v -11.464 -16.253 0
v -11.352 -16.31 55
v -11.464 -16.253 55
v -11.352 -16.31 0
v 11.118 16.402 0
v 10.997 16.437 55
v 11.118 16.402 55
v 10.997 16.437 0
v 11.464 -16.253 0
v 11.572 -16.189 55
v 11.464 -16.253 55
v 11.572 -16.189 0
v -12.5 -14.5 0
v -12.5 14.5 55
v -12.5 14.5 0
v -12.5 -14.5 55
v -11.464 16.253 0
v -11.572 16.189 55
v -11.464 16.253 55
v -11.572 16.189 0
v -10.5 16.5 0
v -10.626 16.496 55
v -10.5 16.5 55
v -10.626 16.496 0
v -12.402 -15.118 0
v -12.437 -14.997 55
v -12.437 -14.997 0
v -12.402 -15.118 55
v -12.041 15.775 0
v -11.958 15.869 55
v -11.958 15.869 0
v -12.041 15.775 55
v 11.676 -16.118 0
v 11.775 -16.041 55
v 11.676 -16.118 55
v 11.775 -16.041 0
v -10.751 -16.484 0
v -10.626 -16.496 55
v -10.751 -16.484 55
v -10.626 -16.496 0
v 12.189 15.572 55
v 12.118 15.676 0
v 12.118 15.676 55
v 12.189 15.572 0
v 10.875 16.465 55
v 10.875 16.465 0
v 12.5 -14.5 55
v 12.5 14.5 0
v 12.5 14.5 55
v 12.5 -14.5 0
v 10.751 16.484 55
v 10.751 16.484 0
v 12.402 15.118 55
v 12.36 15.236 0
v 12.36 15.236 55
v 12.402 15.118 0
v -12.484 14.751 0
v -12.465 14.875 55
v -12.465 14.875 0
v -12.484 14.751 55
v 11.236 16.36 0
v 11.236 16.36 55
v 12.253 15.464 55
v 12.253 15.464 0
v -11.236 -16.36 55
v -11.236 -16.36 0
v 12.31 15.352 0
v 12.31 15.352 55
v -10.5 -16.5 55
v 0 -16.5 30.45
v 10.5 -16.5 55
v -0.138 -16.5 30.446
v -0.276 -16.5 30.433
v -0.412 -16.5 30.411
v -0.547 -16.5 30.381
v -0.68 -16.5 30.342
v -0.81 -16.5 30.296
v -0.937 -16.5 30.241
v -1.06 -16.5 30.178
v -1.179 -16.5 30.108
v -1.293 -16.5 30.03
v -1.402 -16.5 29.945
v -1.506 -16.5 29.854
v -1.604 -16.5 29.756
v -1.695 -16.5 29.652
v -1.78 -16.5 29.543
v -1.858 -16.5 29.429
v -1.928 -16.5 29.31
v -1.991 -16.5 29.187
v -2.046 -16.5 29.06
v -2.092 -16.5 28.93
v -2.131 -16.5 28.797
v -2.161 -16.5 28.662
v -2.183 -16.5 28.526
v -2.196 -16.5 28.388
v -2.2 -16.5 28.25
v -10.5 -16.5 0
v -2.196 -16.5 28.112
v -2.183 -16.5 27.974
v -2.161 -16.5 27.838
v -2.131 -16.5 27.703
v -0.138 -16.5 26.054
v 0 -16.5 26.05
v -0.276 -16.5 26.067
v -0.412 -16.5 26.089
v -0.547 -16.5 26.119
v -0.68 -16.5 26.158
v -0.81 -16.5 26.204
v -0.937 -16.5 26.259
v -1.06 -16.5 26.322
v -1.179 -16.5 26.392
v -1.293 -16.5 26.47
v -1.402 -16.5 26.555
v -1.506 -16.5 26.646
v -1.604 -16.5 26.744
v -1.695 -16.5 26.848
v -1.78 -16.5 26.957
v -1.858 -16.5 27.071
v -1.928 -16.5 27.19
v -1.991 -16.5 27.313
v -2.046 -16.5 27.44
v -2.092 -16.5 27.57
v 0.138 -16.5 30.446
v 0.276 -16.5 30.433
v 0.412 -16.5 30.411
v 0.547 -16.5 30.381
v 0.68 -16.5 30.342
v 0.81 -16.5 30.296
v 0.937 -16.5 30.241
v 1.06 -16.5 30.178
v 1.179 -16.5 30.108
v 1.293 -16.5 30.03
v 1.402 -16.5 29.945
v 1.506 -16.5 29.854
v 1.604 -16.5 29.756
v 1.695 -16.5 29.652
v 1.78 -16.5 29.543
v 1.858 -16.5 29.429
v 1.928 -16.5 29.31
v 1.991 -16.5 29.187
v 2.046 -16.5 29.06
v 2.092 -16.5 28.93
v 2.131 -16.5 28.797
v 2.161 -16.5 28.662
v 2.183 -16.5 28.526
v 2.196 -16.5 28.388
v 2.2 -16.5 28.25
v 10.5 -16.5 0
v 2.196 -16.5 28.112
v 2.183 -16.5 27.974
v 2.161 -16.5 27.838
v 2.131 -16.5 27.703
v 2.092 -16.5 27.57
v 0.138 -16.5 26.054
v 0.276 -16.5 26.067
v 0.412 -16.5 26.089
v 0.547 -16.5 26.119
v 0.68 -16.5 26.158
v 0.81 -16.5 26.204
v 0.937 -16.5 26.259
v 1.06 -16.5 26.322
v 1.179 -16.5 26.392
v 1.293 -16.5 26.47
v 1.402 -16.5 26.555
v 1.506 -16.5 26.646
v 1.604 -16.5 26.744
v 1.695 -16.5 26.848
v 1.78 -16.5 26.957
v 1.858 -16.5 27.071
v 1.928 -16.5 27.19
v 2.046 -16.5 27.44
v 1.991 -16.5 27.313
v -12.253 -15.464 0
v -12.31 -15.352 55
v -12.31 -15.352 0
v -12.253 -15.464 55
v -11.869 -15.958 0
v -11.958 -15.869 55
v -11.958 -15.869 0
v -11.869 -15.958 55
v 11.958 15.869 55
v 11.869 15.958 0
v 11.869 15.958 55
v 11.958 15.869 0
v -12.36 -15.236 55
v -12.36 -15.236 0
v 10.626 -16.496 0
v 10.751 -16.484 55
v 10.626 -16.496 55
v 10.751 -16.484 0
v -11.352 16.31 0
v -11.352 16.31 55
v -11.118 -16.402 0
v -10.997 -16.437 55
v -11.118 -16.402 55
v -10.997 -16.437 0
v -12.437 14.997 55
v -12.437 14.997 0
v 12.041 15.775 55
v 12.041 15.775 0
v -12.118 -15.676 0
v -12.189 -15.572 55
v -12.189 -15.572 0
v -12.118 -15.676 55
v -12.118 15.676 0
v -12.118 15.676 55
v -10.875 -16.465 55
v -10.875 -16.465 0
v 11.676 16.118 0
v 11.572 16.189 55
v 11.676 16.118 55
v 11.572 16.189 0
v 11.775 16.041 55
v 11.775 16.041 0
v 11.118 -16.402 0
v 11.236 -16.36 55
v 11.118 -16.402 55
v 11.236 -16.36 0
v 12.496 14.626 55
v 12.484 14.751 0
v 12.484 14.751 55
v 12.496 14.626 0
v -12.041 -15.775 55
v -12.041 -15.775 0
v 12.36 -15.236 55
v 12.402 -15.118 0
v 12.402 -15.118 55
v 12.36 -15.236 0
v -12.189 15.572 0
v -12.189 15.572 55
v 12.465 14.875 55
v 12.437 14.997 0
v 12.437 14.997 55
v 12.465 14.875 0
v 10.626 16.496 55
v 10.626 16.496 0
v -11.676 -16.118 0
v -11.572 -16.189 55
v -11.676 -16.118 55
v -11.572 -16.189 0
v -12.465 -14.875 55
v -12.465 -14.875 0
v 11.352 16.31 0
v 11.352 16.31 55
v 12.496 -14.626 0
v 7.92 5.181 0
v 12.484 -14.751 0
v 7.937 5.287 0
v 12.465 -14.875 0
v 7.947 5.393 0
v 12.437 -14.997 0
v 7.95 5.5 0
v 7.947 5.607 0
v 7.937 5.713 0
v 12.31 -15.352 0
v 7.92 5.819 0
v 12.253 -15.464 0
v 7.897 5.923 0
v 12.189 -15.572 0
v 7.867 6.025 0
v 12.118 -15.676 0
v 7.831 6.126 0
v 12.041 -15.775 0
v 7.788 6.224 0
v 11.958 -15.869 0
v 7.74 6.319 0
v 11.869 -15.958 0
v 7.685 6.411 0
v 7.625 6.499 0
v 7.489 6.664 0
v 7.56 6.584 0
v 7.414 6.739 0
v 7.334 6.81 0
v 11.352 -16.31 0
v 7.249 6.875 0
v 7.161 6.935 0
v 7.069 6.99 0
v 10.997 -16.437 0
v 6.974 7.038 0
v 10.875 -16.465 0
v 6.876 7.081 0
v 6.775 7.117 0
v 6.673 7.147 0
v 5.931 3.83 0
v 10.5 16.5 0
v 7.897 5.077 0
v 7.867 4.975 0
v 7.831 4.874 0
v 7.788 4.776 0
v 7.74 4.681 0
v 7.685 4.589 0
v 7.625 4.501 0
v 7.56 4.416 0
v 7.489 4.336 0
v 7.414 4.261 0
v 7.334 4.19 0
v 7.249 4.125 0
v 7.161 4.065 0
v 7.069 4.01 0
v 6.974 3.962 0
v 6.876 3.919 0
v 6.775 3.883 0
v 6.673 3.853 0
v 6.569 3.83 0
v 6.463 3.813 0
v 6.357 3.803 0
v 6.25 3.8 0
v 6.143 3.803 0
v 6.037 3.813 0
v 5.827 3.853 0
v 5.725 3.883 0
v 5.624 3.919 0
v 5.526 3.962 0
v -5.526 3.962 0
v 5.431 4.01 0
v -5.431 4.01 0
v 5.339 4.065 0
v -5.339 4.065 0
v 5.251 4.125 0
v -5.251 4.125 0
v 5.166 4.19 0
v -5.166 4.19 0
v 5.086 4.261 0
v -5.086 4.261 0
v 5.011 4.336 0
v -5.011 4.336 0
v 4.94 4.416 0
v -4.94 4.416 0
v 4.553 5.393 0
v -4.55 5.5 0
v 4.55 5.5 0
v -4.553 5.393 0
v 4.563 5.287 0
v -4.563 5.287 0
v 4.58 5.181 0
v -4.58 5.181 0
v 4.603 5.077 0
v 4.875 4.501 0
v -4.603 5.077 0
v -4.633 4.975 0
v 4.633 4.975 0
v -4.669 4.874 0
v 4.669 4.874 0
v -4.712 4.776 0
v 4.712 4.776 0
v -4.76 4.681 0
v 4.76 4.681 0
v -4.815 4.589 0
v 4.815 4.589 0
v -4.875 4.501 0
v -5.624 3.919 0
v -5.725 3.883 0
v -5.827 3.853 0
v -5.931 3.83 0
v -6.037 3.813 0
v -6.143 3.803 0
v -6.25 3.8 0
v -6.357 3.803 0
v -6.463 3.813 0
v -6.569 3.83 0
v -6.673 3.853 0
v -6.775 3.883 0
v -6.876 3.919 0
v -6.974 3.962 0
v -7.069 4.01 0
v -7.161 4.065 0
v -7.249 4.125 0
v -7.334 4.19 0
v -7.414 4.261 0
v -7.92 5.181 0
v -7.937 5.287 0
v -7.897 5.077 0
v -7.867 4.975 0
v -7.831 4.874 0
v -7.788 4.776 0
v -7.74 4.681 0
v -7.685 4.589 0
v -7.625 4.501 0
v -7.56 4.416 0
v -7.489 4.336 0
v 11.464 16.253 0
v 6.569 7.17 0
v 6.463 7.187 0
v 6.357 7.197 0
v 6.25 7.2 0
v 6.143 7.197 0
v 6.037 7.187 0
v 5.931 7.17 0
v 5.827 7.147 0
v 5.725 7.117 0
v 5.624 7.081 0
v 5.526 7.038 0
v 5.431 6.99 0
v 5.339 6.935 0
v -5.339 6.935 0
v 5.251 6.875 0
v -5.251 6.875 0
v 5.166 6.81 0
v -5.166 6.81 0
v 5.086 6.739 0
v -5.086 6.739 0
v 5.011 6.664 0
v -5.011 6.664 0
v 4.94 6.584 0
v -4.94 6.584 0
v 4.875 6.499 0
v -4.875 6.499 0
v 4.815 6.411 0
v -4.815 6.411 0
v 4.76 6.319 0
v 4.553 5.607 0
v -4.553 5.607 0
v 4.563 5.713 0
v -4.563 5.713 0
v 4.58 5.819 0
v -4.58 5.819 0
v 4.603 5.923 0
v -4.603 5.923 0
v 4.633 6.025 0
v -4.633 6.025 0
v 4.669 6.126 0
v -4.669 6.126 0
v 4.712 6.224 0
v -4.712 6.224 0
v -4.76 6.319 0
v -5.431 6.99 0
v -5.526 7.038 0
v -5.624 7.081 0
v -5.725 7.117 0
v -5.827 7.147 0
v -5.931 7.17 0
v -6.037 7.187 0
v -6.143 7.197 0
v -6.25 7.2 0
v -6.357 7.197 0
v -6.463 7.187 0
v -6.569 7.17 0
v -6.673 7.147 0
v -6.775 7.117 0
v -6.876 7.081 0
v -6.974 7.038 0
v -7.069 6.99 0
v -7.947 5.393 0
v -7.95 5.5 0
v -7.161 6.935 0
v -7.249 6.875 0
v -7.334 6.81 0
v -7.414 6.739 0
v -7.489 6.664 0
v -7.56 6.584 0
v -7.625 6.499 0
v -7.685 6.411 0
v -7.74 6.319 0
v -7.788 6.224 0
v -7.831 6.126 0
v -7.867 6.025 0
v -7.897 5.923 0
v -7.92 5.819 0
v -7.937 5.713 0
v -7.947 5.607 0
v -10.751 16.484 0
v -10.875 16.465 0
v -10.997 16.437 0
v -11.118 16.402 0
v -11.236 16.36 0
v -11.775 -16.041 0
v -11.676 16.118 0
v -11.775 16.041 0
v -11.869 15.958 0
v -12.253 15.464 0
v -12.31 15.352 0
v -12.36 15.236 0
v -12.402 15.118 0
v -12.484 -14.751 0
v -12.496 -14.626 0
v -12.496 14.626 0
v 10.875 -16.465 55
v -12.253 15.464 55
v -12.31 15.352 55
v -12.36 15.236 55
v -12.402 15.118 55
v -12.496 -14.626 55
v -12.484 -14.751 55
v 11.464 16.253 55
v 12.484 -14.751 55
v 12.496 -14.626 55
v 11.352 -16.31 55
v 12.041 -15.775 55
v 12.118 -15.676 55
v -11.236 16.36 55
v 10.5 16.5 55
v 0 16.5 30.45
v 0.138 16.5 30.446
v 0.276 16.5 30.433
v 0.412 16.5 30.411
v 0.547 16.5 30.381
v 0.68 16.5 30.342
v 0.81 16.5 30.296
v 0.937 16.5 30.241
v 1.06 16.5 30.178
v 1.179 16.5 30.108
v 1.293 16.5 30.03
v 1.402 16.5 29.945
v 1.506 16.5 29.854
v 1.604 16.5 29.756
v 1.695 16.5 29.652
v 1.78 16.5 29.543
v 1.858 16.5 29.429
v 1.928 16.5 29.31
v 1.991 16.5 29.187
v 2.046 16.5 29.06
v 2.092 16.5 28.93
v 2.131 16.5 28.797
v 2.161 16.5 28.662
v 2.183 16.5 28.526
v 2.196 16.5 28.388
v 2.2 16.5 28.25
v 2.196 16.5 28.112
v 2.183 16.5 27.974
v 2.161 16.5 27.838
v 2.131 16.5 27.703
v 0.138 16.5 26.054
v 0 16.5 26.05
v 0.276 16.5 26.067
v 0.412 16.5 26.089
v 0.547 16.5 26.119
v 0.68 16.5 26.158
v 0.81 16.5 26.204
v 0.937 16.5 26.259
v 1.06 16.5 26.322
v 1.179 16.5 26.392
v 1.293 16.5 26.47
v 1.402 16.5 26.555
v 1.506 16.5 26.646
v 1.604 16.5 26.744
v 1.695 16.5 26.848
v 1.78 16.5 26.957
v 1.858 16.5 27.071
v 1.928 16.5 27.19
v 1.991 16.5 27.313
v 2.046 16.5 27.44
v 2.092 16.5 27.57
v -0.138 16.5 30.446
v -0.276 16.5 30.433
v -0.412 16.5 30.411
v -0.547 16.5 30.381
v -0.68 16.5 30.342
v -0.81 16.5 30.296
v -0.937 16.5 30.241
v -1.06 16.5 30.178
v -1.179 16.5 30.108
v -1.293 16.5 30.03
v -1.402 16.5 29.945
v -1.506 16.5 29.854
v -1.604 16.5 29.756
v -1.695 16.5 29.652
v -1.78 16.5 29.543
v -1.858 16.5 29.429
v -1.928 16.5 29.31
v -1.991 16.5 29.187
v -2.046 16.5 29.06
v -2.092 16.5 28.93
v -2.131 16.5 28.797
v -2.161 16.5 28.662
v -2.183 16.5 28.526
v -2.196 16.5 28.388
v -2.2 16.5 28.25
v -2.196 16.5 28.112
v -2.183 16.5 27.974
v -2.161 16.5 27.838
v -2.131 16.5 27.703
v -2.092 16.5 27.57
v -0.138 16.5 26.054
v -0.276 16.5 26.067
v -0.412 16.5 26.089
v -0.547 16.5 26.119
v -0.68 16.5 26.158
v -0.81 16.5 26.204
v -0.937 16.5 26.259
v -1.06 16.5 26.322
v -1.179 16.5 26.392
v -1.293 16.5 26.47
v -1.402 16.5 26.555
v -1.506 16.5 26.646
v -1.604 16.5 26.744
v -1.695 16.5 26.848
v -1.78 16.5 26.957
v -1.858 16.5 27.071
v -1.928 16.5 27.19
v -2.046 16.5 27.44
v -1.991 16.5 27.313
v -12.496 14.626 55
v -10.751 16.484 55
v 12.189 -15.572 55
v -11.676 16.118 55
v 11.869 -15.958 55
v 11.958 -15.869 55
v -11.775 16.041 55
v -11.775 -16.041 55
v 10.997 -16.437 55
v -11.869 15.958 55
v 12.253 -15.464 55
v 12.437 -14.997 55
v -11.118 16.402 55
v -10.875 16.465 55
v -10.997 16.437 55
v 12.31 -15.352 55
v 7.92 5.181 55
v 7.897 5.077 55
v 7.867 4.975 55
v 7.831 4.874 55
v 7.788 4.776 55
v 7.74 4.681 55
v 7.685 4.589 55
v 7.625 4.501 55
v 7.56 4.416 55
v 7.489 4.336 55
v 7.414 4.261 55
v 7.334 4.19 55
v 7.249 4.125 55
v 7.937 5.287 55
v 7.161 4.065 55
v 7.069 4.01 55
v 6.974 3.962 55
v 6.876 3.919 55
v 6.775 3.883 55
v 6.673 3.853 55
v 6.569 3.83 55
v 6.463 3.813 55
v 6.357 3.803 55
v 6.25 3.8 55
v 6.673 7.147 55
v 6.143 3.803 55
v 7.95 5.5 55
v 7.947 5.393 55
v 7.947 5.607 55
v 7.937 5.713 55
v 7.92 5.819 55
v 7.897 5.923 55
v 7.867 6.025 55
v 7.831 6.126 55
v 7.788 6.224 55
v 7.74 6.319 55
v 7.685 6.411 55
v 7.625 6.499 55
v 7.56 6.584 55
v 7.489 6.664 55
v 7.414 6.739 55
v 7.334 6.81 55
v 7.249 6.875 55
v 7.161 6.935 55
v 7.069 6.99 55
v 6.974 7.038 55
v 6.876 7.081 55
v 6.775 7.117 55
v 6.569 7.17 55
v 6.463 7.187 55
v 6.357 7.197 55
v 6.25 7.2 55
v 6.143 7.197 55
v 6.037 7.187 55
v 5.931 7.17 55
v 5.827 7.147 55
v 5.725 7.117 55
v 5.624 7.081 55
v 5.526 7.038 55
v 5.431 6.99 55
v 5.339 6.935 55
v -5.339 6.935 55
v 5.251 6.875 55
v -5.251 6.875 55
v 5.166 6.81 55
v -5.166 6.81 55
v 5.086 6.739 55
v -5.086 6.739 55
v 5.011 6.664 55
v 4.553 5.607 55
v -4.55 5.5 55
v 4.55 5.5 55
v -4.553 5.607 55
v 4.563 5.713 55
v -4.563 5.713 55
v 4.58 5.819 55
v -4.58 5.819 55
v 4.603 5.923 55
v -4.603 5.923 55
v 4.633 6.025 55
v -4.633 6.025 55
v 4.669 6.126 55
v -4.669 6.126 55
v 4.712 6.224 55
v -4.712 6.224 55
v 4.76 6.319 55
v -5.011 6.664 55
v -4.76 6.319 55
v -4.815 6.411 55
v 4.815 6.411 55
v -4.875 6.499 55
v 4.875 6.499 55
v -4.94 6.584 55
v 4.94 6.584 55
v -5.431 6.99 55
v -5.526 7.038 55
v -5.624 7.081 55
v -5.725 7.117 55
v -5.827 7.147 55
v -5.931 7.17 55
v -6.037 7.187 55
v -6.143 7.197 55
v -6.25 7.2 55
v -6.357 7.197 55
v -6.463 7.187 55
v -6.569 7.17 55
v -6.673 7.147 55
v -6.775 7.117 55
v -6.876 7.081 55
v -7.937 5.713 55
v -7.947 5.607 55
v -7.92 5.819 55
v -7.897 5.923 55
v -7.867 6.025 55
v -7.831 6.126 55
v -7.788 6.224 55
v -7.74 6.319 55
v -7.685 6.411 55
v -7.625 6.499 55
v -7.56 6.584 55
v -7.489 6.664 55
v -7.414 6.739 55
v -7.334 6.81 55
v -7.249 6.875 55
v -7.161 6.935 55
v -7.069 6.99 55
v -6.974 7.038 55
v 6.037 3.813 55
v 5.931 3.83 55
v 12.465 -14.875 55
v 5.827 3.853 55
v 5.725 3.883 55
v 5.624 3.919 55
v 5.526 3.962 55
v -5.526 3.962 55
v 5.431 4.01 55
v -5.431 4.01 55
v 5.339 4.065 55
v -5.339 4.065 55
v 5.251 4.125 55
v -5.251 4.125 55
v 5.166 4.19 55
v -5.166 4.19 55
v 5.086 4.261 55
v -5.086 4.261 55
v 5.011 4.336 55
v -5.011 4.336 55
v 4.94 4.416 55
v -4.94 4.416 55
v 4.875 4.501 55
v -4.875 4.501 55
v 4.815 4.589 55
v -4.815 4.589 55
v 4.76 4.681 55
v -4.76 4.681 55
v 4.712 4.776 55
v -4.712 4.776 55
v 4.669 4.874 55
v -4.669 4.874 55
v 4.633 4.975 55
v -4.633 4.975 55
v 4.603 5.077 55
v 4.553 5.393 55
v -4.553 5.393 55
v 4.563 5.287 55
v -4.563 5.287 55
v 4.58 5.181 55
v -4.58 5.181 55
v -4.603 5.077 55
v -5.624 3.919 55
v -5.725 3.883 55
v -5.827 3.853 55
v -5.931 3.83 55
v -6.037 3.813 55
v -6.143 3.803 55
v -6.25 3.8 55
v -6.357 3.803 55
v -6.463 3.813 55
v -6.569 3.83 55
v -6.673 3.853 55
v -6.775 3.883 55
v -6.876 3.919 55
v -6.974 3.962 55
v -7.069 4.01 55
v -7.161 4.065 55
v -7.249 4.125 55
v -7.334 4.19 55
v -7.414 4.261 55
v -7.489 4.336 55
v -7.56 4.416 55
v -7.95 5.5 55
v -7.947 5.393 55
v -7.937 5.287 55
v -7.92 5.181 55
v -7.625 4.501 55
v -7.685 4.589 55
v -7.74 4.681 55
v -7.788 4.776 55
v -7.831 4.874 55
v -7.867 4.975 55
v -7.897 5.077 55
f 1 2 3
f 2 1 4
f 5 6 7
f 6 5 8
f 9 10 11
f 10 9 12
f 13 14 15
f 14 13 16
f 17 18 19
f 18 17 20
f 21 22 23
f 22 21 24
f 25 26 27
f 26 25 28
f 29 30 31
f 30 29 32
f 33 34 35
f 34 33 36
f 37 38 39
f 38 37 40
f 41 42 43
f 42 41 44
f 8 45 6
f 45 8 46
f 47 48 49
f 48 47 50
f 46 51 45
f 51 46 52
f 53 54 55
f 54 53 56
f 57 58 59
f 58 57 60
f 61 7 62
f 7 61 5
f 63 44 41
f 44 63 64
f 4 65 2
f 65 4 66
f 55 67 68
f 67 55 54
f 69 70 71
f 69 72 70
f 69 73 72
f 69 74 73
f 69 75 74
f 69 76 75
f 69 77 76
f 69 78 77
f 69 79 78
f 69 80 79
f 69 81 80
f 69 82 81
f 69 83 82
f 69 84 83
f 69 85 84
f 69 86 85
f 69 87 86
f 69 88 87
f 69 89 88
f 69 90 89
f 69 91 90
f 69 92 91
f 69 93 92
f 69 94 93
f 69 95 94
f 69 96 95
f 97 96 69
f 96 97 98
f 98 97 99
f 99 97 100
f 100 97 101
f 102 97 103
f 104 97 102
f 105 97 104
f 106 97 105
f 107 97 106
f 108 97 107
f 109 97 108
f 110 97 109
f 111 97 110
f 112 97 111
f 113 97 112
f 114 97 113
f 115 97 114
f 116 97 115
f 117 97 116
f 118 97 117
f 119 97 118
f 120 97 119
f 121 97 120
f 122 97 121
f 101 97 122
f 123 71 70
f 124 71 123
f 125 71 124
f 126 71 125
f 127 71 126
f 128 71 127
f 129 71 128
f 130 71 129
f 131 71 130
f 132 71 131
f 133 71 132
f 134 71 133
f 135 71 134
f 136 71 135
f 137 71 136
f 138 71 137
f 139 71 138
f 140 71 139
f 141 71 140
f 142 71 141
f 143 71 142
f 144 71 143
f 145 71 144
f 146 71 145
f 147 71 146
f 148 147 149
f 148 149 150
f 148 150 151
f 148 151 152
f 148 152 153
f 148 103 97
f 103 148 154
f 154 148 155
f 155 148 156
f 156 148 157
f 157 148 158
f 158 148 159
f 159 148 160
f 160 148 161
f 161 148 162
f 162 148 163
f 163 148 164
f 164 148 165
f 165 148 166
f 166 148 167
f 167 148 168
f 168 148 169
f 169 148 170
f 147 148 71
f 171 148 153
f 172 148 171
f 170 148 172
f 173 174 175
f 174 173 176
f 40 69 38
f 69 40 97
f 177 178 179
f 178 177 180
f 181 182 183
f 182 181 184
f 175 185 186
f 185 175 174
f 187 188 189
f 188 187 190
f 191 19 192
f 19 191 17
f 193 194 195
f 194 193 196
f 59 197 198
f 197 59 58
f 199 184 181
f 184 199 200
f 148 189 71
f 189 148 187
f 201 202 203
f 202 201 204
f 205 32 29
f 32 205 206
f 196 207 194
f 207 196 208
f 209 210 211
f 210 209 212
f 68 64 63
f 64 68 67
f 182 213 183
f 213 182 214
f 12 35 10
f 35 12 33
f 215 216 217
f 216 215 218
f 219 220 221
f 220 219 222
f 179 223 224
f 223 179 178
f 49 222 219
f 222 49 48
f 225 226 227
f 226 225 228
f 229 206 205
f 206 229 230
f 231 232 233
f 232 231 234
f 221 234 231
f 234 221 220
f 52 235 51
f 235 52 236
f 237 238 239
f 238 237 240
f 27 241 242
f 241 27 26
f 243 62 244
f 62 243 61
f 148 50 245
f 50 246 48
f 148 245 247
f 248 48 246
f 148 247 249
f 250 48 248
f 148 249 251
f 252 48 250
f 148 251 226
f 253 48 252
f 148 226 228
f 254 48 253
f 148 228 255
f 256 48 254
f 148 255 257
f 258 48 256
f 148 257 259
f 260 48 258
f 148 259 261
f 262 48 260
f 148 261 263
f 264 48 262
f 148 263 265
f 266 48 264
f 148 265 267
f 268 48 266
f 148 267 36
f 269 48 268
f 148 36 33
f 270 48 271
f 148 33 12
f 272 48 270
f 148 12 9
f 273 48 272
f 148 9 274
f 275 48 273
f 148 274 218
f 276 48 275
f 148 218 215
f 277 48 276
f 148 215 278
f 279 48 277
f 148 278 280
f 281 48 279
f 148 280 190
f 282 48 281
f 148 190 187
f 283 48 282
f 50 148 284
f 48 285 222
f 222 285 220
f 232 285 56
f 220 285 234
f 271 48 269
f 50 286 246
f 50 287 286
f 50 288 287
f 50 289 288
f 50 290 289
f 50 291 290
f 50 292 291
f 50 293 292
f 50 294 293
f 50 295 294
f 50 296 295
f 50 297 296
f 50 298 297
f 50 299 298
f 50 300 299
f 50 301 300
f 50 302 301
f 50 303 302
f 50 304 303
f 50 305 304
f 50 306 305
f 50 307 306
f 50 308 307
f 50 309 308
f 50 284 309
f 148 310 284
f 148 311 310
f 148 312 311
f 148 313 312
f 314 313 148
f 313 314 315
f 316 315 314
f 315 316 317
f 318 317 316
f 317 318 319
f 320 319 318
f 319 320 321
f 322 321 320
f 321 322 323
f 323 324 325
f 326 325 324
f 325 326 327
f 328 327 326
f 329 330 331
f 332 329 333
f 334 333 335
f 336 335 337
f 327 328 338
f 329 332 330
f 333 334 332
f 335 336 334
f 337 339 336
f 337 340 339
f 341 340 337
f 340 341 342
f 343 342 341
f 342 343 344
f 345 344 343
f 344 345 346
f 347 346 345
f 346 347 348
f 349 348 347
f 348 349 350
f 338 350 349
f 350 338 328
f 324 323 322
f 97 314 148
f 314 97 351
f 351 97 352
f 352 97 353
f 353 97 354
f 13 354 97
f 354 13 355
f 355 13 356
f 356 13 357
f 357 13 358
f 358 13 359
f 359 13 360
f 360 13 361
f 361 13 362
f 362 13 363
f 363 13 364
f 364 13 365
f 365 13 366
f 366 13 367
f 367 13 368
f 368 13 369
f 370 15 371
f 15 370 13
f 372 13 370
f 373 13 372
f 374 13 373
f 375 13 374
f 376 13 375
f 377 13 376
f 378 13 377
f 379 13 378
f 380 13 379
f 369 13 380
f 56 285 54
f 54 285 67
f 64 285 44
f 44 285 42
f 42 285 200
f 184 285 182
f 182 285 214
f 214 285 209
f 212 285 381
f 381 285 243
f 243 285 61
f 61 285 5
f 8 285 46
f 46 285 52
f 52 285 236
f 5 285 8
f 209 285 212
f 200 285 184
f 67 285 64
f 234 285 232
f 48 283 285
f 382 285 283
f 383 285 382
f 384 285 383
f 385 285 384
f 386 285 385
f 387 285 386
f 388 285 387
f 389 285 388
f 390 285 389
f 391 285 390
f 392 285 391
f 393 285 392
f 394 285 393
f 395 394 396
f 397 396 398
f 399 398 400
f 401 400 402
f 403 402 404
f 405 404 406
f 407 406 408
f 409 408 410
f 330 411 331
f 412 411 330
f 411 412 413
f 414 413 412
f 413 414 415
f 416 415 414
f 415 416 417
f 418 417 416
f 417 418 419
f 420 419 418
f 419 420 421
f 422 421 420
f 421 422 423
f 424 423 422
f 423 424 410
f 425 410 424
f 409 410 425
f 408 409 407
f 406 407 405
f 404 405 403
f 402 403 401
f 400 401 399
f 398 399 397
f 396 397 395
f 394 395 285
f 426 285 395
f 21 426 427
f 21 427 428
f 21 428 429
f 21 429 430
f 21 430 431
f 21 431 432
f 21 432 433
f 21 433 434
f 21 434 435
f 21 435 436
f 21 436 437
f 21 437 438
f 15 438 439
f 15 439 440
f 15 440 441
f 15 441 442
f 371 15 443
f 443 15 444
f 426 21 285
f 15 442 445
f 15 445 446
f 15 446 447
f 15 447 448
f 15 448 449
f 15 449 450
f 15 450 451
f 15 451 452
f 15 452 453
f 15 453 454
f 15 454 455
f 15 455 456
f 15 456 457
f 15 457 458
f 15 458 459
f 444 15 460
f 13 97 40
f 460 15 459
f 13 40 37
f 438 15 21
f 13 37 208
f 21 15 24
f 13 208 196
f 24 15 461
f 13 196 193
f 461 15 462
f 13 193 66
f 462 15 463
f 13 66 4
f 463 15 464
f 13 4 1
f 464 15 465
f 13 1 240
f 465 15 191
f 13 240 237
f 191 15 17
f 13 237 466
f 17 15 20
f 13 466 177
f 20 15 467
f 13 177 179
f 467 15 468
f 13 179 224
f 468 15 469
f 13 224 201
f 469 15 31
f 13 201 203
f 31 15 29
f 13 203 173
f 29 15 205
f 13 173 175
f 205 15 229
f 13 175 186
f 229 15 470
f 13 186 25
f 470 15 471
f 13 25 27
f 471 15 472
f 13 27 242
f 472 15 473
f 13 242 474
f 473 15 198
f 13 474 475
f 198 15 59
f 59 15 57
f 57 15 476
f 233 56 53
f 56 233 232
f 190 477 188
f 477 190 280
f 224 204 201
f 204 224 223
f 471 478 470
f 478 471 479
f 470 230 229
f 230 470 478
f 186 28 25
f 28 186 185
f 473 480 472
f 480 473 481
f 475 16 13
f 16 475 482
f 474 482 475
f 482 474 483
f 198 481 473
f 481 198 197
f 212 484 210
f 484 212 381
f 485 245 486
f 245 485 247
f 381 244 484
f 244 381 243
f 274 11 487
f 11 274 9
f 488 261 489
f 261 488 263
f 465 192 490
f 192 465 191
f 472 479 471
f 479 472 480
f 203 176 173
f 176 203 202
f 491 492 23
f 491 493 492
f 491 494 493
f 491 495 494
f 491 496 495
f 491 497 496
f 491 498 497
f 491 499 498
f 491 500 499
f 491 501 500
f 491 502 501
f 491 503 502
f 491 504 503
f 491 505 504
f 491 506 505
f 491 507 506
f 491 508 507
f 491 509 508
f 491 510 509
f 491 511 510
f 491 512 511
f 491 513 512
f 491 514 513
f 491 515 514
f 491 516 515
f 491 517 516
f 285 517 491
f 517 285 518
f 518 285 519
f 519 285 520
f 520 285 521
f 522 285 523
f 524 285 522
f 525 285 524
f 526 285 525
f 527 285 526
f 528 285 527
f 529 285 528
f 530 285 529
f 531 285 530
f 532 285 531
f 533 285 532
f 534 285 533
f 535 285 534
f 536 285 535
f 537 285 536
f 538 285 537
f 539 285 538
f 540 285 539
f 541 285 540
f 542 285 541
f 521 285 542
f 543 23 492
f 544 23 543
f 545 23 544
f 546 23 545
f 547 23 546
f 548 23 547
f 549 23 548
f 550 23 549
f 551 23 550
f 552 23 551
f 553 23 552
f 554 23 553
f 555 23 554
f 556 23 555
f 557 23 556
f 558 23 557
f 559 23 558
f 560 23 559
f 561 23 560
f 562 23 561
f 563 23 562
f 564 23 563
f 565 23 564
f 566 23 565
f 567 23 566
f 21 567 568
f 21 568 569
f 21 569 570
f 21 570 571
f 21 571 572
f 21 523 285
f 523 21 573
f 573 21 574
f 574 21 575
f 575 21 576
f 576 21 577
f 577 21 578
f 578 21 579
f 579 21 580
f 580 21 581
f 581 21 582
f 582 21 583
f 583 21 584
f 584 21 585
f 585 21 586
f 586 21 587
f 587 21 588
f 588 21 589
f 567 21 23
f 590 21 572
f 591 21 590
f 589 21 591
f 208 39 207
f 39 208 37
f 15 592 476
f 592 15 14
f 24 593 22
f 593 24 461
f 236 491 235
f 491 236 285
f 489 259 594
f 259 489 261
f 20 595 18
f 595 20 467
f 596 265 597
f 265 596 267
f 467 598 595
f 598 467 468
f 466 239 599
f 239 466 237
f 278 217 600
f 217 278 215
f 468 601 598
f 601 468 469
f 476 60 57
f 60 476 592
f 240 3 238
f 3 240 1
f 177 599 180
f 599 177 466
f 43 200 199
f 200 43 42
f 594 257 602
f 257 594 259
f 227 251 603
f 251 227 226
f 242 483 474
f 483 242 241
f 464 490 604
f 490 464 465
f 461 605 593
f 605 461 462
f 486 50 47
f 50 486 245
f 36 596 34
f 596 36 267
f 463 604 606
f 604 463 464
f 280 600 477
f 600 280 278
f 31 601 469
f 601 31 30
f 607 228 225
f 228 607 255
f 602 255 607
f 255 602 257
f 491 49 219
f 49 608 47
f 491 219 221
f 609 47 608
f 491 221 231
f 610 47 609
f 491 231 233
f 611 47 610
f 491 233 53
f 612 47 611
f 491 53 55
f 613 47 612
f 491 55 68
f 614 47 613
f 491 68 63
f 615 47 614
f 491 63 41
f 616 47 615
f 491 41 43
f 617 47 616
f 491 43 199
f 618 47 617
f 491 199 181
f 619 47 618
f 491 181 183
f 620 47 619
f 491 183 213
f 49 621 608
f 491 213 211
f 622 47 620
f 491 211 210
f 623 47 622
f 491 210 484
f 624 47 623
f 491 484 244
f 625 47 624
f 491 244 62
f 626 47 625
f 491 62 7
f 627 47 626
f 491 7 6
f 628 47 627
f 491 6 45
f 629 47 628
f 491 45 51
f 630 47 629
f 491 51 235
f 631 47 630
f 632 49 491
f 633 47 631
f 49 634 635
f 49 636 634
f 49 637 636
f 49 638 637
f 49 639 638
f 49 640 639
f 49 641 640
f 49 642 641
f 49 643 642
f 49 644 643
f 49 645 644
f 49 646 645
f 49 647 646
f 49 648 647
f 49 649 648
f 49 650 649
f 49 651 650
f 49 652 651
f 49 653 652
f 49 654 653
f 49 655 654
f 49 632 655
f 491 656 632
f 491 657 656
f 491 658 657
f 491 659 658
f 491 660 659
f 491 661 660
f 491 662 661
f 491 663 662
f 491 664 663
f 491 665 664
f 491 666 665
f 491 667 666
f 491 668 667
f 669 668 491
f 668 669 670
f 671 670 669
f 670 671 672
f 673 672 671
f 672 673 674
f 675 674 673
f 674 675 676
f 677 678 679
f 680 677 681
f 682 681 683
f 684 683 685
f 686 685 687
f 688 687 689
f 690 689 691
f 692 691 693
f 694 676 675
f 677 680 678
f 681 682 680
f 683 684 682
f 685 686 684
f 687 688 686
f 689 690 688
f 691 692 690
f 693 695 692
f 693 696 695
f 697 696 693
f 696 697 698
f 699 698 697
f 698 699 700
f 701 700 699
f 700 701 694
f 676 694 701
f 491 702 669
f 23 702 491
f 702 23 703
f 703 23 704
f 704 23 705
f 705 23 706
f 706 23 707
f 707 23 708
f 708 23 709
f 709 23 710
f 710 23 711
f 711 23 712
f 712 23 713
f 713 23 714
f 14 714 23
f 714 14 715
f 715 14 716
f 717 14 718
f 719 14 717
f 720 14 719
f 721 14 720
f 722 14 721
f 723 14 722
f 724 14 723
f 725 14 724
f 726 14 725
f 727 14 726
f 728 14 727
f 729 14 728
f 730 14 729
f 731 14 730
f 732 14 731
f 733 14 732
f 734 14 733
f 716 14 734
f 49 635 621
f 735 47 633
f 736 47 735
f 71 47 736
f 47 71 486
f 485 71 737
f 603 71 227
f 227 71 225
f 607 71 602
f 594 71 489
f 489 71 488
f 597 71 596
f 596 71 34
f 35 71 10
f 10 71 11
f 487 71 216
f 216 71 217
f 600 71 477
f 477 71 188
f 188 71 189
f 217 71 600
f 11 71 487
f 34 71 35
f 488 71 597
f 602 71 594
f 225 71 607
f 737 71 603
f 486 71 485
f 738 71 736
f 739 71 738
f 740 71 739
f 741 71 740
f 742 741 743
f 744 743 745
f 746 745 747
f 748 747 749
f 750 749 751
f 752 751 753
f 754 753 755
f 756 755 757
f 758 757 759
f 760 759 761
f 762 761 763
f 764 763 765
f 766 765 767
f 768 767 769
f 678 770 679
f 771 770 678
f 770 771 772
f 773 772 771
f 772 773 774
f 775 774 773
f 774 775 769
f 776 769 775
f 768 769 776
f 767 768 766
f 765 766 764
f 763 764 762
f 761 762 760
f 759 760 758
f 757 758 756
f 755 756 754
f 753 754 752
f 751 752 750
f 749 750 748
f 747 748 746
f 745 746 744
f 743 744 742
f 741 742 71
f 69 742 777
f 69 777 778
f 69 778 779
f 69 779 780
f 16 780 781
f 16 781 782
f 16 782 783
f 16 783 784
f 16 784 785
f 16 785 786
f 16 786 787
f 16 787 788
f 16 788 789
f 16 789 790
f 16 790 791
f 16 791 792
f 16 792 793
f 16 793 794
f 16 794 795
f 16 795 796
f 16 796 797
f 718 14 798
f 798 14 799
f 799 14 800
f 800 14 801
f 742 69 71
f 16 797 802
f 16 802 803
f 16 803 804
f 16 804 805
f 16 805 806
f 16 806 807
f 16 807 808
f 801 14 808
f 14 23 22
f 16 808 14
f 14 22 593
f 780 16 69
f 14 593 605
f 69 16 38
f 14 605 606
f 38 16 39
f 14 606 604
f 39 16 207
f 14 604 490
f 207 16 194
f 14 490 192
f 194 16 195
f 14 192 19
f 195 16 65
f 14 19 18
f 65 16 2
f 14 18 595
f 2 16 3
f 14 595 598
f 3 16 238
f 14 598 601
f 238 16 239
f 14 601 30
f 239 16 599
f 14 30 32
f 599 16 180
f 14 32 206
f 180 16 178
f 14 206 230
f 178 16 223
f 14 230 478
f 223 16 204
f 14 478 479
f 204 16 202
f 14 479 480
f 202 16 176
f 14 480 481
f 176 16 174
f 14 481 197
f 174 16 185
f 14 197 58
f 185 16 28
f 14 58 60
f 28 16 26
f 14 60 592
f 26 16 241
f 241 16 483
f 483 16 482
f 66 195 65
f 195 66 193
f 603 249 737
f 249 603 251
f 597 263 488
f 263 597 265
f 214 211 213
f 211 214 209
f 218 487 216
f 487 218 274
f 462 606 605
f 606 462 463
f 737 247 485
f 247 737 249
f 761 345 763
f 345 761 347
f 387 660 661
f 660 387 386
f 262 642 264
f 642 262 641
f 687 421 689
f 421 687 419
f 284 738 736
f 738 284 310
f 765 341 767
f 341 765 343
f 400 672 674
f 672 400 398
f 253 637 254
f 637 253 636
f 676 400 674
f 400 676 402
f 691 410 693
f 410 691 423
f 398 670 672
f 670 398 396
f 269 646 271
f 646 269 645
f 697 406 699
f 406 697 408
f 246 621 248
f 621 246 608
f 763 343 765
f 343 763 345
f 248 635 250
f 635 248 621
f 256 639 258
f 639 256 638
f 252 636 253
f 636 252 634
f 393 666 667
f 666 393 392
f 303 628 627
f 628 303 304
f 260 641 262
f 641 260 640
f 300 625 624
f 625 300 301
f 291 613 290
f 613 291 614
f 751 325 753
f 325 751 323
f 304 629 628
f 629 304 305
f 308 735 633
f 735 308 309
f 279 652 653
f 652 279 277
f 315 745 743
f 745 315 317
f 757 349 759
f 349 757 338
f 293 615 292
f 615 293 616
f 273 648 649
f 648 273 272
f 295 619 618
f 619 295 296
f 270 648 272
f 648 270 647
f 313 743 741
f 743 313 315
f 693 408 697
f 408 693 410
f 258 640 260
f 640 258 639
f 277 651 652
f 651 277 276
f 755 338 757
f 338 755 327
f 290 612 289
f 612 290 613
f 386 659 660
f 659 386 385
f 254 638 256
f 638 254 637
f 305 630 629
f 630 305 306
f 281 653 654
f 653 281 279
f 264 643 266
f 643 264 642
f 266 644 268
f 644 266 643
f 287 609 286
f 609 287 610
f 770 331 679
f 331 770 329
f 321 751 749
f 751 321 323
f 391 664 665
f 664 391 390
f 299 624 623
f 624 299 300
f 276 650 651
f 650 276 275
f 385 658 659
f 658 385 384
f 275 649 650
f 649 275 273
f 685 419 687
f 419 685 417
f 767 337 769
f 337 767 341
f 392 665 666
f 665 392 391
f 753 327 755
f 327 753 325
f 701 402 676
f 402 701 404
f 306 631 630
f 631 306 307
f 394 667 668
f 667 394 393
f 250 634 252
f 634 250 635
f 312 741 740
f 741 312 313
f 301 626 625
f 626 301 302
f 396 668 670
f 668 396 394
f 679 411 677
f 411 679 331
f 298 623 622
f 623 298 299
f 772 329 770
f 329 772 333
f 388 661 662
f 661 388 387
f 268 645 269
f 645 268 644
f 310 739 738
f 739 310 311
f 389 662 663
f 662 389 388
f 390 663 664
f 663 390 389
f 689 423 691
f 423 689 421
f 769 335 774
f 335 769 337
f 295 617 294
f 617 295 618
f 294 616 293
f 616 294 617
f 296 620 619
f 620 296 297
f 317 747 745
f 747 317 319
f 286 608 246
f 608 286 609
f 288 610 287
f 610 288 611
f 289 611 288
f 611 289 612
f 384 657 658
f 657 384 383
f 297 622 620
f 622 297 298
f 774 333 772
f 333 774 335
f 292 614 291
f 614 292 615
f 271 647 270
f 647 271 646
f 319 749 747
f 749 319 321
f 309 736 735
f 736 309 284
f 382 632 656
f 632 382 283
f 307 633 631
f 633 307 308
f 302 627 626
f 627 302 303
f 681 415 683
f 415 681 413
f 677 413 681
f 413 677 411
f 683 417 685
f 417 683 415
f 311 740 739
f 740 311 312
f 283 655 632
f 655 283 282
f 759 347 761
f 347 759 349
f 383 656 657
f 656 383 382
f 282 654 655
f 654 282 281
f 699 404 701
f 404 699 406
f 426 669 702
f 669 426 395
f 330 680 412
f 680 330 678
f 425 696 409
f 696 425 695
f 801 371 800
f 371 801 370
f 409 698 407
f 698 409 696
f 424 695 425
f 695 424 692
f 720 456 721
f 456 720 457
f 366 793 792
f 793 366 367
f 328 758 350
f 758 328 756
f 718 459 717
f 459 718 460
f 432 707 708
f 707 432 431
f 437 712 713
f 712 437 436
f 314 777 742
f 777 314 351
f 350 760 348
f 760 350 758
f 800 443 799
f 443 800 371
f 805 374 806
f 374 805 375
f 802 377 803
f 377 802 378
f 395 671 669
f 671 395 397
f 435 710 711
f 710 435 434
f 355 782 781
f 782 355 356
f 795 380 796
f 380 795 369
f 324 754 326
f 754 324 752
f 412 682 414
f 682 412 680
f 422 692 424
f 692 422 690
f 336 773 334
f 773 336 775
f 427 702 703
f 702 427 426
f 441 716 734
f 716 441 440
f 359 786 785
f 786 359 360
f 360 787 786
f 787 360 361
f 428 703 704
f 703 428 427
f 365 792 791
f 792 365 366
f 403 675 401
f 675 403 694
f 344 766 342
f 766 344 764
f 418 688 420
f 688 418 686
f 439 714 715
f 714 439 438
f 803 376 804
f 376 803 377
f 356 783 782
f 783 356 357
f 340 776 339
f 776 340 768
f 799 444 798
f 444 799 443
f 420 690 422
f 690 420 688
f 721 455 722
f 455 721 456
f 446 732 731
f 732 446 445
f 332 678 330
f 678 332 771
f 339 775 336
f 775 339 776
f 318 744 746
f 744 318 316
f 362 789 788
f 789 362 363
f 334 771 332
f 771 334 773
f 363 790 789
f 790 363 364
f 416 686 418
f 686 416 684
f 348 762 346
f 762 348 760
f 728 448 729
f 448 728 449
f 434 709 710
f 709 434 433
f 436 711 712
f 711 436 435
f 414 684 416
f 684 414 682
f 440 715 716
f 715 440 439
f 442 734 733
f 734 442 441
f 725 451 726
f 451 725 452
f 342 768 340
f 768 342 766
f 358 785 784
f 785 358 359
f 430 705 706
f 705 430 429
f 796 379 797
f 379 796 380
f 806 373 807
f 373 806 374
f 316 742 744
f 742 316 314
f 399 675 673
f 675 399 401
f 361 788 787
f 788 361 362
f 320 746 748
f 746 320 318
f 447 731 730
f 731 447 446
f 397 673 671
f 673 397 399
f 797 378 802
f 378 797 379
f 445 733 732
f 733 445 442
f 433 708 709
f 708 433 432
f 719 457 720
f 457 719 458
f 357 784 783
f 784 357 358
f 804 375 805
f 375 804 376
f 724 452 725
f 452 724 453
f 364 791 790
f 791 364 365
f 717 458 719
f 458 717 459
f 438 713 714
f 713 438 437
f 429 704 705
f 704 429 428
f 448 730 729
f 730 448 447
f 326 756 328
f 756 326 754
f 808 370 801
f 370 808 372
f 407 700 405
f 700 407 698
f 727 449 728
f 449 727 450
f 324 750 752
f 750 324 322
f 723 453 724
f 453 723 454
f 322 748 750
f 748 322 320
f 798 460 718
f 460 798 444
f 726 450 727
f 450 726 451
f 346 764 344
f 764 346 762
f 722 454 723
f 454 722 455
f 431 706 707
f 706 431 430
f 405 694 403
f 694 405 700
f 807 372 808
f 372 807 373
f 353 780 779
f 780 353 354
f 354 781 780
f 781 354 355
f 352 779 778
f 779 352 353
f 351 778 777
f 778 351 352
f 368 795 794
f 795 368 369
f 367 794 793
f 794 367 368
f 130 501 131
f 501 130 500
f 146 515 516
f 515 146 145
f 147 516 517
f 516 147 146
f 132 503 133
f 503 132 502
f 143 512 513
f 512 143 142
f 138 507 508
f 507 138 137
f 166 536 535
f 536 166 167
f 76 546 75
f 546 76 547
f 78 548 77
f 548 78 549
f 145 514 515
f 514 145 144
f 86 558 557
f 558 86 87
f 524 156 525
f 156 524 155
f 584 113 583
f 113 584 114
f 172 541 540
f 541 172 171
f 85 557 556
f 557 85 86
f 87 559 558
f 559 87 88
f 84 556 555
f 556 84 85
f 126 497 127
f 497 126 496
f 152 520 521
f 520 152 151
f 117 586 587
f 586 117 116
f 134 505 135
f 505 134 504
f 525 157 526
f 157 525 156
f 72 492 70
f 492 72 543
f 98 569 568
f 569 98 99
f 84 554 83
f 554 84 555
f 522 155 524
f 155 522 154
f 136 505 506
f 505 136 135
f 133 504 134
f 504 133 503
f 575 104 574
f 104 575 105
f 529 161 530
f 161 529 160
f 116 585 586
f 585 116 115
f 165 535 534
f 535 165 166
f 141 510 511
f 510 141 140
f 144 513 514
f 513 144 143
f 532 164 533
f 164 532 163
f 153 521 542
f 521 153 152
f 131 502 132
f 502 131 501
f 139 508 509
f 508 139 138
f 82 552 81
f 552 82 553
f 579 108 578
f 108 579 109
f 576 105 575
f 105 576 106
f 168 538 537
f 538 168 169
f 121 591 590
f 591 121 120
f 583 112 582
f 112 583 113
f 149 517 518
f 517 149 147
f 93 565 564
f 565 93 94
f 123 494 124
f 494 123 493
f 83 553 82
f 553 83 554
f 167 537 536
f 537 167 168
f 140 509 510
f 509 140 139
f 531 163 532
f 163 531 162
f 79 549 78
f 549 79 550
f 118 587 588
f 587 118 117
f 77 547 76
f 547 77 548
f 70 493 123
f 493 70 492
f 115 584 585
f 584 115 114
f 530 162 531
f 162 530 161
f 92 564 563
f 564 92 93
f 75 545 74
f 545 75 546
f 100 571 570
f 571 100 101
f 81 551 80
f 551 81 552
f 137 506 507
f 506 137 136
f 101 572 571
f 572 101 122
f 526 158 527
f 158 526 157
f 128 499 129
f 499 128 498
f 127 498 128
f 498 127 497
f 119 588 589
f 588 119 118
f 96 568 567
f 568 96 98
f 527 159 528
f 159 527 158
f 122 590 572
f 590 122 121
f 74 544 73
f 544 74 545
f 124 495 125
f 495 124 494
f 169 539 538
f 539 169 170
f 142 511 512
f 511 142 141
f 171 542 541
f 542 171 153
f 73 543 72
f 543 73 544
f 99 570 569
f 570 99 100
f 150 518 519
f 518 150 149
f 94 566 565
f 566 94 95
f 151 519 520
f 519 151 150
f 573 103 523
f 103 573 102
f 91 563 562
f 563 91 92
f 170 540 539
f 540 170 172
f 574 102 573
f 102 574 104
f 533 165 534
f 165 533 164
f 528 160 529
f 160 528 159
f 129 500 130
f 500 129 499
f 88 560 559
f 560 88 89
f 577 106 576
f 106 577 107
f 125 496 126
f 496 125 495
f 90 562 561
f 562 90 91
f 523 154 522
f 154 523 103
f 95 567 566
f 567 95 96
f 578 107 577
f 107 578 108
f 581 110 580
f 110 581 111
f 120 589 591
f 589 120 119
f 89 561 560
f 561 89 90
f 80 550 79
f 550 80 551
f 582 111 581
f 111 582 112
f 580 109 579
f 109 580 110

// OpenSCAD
$fn=100;

// nut dimensions wrench, height, epsilon
/*  UNUSED
wNut = 5.5;
hNut = 2.5;
eNut = 0.2;
*/

// guitar max thickness at butt
hGuitar = 44;

// block height,width,depth
hBlock = 55;
wBlock = 25;
dBlock = 33;


// slot height above base and below top of column, all the rest is computed
sHeight=10;

// dBolt depthwise offset from face away from guitar
dOffset = dBlock/3.;

//hBolt hole offset from base
hOffset = hBlock-hGuitar/2.0; // high hole centered
hlOffset =  28.25;  // low hole average of 28 and 28.5

// bolt diamenters and epsilon
dBolt = 3;
hBolt = 4;
eBolt = 0.2;

// oval cover plate, ratio of ovality 2/1
hPlate = 3;
wPlate = wBlock;
ePlate=1;
ratioPlate = 0.5;

// single hol cylindrical spacer
dCy = 20.0;
hCy = hBlock;

module cyPlate(){
    color("green")
    //scale([1,1,1])
        cylinder(d=dCy-ePlate,h=hPlate,center=true);
}

module cyBlock(hh,dd){
   color("SteelBlue")
       translate([0,0,hh/2.0])
           cylinder(d=dd, h=hh, center=true);
} 

module plate(){
    color("green")
    scale([1,ratioPlate,1])
        cylinder(d=wPlate-ePlate,h=hPlate,center=true);
}
/* UNUSED
module nut(wrench,thickness){
    // make a nut, centered at 0,0,0
    r = wrench/(2.0*cos(30));
    translate([0,0,-thickness/2.0])
        rotate([0,0,30])
        linear_extrude(height=thickness)
            circle(r,$fn=6);   
}
module slot(w,l,h){
    // make a slot centered at 0,0,0
    translate([0,0,h/2.0])
        cube([w,l,h],center=true);
}
*/
module column(rCol,hCol){
    // make the column, based at 0,0,0
    cylinder(r=rCol,h=hCol);
} 
    
module block(hh,w,d,rr=2,rounded=true){
    // make a block centered at 0,0,0
    color("SteelBlue")
    if (!rounded){
        translate([0,0,hh/2.0]){
            cube([w,d,hh], center=true);
        }
    }
    else{
        x = w/2.-rr;
        y = d/2.-rr;
        hull(){
            translate([-x,-y,0])
                cylinder(r=rr,h=hh);
            translate([-x,y,0])
                cylinder(r=rr,h=hh);
            translate([x,-y,0])
                cylinder(r=rr,h=hh);
            translate([x,y,0])
                cylinder(r=rr,h=hh);
        }
    }
}
        
module all(cHeight,bDia,bEps,low, blocks,plates){
    // make a column of h=cHeight, 
    // with a bolt diamter of bDia, applying bEps
    
    hh =  (low ? hlOffset : hOffset);
    db = dBlock;
    do = dOffset;
    difference(){  
        union(){
            if (blocks)
                block(hBlock,wBlock,db);
            if (plates>0){
                translate([0,db/2.0-do,-5])
                    plate();
            }
            if (plates>1){
                translate([0,db/2.0-do,hBlock+5])
                    plate();
            }
        }
        
        // holes for vertical bolts
        #translate([wBlock/4.0,db/2.0-do,-10])
            column(bEps+bDia/2.0,hBlock+20);
        #translate([-wBlock/4.0,db/2.0-do,-10])
            column(bEps+bDia/2.0,hBlock+20);
        // hole for horizontal bolt
        if (blocks){
            #translate([0,0,hh])
                rotate([90,0,0])
                    translate([0,0,-db/2.-1])
                        column(eBolt+hBolt/2.0,db+2,center=true);
        }
    }
}

module cyAll(cHeight,bDia,bEps, cols, plates){
    // make a cylindrical column of h=cHeight, 
    // with a bolt diamter of bDia, applying bEps   
    difference(){        
        union(){
            if (cols){
                cyBlock(hCy,dCy);
            }
            if (plates>0){
                translate([0,0,-5])
                    cyPlate();
            }
            if (plates>1){
                translate([0,0,hCy+5])
                    cyPlate();
            }
        }
        // hole for vertical bolt
        #translate([0,0,-10])
            column(bEps+bDia/2.0,cHeight+20);
    }
}

module showThemAll(){
    translate([-wBlock-5,0,0]){   
        all(hBlock,dBolt,eBolt,true,1,2);
        translate([wBlock+5,0,0]){
            all(hBlock,dBolt,eBolt,false,1,2);
            translate([wBlock+5,0,0]){
                cyAll(hCy,dBolt,eBolt,1,2);
            }
        }
    }
}

//showThemAll();
//
module blockAll(low,blocks,plates){
   all(hBlock,dBolt,eBolt,low, blocks, plates);
}


//cyAll(hCy,dBolt,eBolt,1,0);
blockAll(true,1,0);
//showThemAll();    
echo("low hole vertical offset", hlOffset);
echo("high hole vertical offset", hBlock - hOffset);
